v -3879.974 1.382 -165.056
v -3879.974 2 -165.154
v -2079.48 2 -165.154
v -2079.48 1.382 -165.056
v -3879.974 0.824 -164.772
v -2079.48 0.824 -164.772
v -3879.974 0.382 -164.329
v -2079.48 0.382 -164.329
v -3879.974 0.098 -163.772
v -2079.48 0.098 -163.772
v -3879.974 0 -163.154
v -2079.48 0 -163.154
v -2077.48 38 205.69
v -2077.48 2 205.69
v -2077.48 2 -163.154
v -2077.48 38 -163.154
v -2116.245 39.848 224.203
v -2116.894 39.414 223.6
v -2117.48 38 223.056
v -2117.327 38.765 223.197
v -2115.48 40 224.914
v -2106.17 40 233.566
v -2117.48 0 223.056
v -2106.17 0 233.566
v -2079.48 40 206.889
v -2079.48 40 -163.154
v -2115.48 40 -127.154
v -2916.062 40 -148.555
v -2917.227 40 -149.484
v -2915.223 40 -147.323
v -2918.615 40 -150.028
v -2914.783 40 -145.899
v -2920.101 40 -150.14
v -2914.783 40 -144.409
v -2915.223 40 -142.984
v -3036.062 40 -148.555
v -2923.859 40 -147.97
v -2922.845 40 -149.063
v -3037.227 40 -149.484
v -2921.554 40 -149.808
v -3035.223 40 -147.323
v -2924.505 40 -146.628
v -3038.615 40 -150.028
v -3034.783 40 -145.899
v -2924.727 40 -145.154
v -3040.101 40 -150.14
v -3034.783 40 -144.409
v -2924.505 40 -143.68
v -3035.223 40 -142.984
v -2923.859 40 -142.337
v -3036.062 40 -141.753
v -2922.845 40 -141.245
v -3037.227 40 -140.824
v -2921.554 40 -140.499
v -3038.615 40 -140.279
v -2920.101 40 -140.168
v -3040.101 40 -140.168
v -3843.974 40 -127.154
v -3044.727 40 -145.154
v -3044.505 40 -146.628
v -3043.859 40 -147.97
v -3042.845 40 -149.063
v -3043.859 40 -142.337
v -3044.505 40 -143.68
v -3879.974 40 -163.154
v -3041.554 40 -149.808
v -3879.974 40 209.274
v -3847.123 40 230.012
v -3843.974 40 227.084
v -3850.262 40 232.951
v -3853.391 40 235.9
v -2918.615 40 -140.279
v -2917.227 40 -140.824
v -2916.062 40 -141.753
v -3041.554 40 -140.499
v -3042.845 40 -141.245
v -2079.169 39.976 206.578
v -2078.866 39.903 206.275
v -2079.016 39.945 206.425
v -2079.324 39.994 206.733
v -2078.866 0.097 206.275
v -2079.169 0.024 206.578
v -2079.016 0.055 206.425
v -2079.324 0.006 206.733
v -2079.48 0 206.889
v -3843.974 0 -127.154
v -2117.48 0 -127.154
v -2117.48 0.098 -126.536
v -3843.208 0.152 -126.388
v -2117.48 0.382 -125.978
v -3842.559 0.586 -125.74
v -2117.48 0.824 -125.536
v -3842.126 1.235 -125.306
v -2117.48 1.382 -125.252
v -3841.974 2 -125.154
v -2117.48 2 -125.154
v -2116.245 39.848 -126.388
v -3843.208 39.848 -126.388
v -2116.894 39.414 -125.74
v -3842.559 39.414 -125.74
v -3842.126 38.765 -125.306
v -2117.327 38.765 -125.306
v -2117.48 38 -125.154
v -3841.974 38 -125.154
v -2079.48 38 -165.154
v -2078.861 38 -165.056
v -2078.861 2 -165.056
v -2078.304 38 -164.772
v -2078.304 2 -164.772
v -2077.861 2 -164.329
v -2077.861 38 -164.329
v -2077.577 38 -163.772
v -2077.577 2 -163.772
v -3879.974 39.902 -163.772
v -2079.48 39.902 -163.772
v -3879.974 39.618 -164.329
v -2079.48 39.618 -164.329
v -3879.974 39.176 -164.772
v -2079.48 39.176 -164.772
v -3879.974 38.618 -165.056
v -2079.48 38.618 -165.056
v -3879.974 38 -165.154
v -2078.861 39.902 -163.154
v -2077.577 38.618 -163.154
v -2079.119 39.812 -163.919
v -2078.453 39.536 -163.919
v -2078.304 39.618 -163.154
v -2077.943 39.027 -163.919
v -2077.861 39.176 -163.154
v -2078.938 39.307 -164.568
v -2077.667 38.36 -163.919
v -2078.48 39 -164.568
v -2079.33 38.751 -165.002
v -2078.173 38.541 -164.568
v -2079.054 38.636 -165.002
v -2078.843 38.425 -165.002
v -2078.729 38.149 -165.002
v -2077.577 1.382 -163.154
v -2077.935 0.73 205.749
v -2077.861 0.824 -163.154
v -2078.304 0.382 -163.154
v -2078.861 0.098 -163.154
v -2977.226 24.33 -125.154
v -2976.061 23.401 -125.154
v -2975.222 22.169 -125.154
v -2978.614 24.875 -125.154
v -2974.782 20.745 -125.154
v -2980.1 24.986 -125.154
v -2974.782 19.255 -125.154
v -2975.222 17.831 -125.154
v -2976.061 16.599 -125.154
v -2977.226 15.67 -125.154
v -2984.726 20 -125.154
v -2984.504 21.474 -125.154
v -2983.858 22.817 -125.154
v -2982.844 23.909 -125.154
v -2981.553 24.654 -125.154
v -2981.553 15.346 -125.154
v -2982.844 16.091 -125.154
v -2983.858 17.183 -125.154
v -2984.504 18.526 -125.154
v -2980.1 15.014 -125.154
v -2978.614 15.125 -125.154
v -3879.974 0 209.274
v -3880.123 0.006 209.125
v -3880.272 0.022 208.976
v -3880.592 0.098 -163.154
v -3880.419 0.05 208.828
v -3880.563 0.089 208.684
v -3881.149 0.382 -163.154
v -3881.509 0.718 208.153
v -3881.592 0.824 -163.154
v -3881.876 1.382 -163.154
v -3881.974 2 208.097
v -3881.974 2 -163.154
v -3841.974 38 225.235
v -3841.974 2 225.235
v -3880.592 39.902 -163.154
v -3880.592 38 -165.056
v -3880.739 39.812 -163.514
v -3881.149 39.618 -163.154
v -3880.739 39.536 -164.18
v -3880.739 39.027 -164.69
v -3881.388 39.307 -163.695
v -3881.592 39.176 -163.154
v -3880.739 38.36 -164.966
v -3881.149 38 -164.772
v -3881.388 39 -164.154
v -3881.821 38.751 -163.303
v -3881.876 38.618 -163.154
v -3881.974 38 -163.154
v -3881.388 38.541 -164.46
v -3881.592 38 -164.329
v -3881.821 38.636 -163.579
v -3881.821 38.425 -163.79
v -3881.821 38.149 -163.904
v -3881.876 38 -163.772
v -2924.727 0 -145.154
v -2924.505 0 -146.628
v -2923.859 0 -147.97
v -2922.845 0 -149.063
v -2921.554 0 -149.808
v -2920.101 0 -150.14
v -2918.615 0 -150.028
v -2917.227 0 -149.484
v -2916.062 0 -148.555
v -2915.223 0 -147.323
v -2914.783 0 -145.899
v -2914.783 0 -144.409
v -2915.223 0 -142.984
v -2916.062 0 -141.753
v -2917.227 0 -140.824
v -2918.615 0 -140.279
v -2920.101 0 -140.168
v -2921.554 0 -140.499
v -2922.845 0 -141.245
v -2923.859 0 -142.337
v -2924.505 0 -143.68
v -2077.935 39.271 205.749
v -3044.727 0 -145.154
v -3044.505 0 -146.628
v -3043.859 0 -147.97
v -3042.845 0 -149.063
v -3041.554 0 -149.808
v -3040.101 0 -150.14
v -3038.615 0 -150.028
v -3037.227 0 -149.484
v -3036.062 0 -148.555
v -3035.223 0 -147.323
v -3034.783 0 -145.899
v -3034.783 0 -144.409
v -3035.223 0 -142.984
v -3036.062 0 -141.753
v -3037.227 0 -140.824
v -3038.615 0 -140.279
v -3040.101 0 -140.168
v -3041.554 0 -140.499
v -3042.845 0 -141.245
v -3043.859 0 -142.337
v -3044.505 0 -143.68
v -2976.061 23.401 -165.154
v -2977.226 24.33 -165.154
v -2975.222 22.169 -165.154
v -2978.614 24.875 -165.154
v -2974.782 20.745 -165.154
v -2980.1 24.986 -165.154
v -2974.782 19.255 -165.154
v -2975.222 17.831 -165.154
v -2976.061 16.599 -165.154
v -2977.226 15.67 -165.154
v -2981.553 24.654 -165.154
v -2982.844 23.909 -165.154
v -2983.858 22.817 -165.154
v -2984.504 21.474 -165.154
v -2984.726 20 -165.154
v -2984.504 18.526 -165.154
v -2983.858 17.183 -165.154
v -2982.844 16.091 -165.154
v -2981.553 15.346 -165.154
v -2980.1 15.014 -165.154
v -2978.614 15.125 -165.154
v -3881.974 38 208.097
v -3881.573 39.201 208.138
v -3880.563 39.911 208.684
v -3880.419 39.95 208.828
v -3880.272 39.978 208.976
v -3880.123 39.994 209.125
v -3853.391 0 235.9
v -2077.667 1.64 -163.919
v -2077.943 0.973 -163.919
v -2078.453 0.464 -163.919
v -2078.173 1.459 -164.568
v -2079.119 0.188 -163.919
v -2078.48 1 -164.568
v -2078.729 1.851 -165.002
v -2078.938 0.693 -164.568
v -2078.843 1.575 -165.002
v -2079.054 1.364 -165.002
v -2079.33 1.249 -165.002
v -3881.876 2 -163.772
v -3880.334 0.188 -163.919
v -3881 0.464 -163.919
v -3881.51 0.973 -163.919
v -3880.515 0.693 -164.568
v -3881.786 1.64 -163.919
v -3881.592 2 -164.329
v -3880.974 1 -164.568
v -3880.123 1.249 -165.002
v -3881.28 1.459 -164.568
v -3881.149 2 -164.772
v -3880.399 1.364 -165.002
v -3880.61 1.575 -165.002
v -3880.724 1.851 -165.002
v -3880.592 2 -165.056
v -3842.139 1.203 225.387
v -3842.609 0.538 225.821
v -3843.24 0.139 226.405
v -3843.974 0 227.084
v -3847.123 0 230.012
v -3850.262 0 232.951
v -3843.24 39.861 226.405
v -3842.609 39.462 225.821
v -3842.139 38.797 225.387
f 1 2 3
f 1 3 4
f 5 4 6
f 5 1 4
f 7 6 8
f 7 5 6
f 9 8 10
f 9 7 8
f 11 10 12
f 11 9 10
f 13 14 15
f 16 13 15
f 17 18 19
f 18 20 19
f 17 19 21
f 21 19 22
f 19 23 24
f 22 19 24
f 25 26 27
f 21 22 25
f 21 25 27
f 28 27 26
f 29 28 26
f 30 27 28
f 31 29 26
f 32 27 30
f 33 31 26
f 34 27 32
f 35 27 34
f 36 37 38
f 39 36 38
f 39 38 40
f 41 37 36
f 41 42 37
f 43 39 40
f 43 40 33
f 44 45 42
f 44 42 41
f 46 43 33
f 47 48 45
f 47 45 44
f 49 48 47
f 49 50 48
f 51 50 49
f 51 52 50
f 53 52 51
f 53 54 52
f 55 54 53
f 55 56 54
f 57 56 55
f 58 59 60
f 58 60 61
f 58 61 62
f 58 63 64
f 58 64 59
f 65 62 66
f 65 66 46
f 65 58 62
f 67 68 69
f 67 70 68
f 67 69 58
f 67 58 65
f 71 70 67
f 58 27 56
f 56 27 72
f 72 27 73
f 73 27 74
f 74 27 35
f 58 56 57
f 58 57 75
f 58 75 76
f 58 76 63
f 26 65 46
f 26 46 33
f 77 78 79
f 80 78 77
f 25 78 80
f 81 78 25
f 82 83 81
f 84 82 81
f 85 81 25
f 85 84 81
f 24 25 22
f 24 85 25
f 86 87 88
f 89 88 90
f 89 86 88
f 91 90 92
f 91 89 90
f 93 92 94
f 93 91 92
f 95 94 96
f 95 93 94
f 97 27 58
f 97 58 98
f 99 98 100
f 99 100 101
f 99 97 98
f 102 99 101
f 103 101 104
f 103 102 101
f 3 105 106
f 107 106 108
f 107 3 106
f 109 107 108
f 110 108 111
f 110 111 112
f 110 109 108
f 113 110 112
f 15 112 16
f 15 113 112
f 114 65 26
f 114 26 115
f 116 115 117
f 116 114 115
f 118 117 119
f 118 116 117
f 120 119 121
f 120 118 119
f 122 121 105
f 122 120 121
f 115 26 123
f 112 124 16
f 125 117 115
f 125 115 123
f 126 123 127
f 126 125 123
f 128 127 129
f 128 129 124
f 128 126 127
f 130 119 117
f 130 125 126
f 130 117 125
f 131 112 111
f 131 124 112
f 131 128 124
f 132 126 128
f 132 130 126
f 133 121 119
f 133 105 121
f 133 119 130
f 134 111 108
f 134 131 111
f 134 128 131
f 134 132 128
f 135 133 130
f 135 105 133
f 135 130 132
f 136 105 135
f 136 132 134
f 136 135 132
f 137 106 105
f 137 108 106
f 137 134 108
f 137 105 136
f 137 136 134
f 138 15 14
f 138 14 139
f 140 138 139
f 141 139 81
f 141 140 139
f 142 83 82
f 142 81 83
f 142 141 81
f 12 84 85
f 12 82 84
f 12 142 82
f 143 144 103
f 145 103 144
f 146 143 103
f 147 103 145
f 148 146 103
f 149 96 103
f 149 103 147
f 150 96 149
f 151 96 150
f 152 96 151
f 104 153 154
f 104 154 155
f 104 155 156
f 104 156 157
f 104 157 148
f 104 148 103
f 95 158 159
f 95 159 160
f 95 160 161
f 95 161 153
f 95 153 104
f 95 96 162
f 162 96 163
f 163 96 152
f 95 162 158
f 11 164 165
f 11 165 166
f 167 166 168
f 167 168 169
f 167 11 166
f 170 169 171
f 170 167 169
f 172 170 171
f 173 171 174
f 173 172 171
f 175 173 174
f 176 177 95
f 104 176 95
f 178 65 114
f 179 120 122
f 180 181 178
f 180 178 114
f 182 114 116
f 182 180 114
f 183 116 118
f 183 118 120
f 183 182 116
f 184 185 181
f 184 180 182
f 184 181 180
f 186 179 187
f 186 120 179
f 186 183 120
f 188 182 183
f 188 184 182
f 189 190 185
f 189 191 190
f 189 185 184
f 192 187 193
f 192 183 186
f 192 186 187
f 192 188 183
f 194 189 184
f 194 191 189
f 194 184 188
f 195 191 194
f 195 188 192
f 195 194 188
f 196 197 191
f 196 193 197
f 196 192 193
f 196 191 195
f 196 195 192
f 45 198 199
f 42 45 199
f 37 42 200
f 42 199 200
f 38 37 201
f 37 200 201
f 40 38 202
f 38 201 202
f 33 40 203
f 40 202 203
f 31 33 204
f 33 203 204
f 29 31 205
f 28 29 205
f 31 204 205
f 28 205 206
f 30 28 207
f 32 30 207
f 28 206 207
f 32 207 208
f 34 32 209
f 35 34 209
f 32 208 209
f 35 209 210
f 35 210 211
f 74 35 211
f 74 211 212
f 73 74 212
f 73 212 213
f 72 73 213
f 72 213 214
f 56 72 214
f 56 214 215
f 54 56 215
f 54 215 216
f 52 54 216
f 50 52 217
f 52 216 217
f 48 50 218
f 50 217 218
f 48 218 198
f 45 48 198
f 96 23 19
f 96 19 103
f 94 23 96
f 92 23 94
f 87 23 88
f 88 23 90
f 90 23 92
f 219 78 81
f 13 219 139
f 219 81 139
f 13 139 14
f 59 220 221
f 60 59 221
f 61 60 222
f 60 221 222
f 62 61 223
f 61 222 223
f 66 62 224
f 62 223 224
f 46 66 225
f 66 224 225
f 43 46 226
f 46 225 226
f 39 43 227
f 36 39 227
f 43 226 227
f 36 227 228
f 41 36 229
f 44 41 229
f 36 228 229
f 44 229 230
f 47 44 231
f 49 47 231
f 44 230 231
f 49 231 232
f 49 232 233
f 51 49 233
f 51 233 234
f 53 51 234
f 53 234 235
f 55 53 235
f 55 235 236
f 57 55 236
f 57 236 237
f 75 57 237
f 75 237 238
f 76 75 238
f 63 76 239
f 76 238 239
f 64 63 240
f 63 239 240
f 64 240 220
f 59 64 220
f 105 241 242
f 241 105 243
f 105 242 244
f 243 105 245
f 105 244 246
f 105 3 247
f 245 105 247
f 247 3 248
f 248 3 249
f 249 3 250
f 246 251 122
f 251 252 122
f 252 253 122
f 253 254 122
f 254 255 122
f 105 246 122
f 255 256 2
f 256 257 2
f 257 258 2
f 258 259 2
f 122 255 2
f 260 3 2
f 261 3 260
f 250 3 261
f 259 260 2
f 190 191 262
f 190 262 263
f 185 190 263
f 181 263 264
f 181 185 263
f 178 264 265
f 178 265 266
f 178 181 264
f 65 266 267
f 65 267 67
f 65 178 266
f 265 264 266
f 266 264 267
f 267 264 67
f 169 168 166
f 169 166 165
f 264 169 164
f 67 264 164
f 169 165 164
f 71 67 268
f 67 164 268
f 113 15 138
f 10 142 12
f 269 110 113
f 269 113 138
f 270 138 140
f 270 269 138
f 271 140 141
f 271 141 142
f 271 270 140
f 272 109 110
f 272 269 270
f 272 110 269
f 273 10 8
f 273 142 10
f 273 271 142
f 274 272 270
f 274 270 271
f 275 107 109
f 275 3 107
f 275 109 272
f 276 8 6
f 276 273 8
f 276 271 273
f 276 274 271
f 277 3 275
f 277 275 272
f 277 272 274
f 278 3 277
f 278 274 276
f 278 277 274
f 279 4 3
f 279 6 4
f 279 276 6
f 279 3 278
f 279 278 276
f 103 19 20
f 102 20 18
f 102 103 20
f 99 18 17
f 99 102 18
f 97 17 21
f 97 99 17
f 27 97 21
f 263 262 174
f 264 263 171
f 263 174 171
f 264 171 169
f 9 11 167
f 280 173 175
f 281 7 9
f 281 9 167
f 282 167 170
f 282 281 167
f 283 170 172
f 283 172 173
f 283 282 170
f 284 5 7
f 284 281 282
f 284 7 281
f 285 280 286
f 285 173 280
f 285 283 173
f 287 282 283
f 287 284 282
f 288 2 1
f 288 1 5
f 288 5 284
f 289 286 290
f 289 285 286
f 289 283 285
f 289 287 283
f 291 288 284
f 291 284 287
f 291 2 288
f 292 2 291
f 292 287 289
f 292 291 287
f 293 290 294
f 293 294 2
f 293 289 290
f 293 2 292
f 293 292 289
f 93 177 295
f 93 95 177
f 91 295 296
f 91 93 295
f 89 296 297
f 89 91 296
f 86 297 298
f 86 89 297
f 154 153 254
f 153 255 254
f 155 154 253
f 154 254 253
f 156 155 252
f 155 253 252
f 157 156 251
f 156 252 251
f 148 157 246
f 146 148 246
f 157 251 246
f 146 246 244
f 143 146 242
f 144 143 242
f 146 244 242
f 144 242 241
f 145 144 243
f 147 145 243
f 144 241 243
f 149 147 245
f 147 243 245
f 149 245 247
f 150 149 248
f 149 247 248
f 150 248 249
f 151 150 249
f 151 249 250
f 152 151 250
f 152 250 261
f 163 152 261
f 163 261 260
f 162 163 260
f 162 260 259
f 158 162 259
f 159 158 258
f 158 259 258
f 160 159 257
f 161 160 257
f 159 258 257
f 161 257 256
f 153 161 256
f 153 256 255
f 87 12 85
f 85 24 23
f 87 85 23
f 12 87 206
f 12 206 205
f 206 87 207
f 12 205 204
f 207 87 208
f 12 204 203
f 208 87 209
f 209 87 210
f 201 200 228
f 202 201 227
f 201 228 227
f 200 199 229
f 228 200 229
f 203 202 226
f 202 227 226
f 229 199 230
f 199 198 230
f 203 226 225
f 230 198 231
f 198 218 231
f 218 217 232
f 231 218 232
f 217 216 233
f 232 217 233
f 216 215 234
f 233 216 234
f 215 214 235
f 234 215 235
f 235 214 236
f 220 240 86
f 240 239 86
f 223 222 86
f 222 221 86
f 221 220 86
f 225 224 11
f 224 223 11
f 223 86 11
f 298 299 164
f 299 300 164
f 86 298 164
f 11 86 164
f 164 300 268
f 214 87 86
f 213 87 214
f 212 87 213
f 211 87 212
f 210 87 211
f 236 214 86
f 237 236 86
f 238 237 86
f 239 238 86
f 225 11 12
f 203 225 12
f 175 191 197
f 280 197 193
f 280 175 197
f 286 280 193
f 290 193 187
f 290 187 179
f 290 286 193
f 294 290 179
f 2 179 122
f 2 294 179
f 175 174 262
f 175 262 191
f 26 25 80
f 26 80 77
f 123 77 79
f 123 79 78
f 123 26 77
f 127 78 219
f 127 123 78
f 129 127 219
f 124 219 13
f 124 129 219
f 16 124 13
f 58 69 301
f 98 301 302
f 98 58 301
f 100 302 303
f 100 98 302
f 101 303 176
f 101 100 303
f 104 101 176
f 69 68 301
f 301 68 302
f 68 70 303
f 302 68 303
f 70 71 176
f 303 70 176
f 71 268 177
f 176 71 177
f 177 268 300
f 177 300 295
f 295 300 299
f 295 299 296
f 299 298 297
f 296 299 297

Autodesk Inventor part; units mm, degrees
ref_plane "YZ Plane" through (0, 0, 0) normal (1, 0, 0) x (0, 1, 0)
ref_plane "XZ Plane" through (0, 0, 0) normal (0, 1, 0) x (-1, 0, 0)
ref_plane "XY Plane" through (0, 0, 0) normal (0, 0, 1) x (1, 0, 0)
sketch "Sketch1" plane through (0, 0, 0) normal (0, 1, 0) x (-1, 0, 0)
  line L0 (3880.5632, 208.6837) -> (3853.3913, 235.9005)
  arc A0 (3880.5632, 208.6837) -> (3881.9735, 208.0967) centre (3881.9785, 210.0967) ccw
  line L1 (2078.8655, 206.2751) -> (2106.1695, 233.5659)
  arc A1 (2077.4795, 205.6899) -> (2078.8655, 206.2751) centre (2077.4516, 207.6897) ccw
  arc A2 (3883.0351, 262.7329) -> (3883.0378, 262.7357) centre (2978.5428, 1160.9837) ccw
  arc A3 (3881.9735, 261.6652) -> (3881.9774, 261.6692) centre (2978.5428, 1160.9837) ccw
  line L2 (2979.7274, -125.1538) -> (3881.9735, -125.1538)
  line L3 (3879.7274, -165.1538) -> (2079.7274, -165.1538)
  line L4 (2079.7274, -125.1538) -> (2979.7274, -125.1538)
  line L5 (3879.7274, -165.1538) -> (3881.9735, -165.1538)
  line L6 (2079.7274, -165.1538) -> (2077.4795, -165.1538)
  line L7 (2117.4795, -125.1538) -> (2077.4795, -125.1538)
  line L8 (2089.1735, -125.1538) -> (3870.2812, -125.1538)
  line L9 (2077.4795, 205.6899) -> (2077.4795, -165.1538)
  line L10 (2117.4795, 223.0557) -> (2117.4795, -125.1538)
  line L11 (3881.9735, 208.0967) -> (3881.9735, -165.1538)
  line L12 (3841.9735, 225.2347) -> (3841.9735, -125.1538)
  line L13 (3841.9735, -125.1538) -> (3881.9735, -125.1538)
  arc A4 (3841.9735, 225.2347) -> (3853.3913, 235.9005) centre (2978.5428, 1160.9837) ccw
  line L14 (2117.4795, 223.0557) -> (2106.1695, 233.5659)
  line L15 (3039.7274, -165.1538) -> (3039.7274, -145.1538)
  circle A5 centre (3039.7274, -145.1538) radius 5
  circle A6 centre (2919.7274, -145.1538) radius 5
  point P0 (0, 0)
  point P1 (2077.4509, 204.8613)
  point P2 (2106.1378, 233.5957)
  point P3 (2712.3694, -125.1538)
  dimension "d20" = 40
  dimension "d21" = 40
extrude "Extrusion1" add sketch "Sketch1" along normal blind 40 contours A0 L11 L2 L12 A4 L0 | L11 L5 L3 L6 L9 L7 L4 L2 | L4 L7 L9 A1 L1 L14 L10 | A5 | A6
fillet "Fillet1" radius 2 10 edges at (-3841.9735, 40, 50.0404) (-2979.7265, 40, -125.1538) (-3881.9735, 40, -145.1538) (-3881.9735, 40, 41.4714) (-2978.6034, 40, -165.1538) (-2077.4795, 40, 40.268) (-2077.4795, 40, -145.1538) (-2117.4795, 40, 48.9509) (-3841.9735, 0, 50.0404) (-2979.7265, 0, -125.1538)
fillet "Fillet2" radius 2 9 edges at (-2077.4795, 0, 40.268) (-2077.4795, 0, -145.1538) (-2978.6034, 0, -165.1538) (-2078.0653, 39.4142, -164.568) (-2077.4795, 19, -165.1538) (-3881.3877, 39.4142, -164.568) (-3881.9735, 19, -165.1538) (-3881.9735, 0, 41.4714) (-3881.9735, 0, -145.1538)
sketch "Sketch2" plane through (-2079.4795, 2, -165.1538) normal (0, 0, -1) x (-1, 0, 0)
  line L0 (0, 0) -> (0, 36) projected
  line L1 (0, 18) -> (1800.494, 18)
  line L2 (1800.494, 36) -> (1800.494, 0) projected
  circle A0 centre (900.247, 18) radius 5
  point P0 (-2079.4795, -2)
  dimension "d27" = 10
extrude "Extrusion2" cut sketch "Sketch2" against normal blind 50
extrude "Extrusion3" cut sketch "Sketch1" along normal blind 60 contours A5 | A6
properties part number "BASE_FUNDO_SUPORTE_LAMINA"
